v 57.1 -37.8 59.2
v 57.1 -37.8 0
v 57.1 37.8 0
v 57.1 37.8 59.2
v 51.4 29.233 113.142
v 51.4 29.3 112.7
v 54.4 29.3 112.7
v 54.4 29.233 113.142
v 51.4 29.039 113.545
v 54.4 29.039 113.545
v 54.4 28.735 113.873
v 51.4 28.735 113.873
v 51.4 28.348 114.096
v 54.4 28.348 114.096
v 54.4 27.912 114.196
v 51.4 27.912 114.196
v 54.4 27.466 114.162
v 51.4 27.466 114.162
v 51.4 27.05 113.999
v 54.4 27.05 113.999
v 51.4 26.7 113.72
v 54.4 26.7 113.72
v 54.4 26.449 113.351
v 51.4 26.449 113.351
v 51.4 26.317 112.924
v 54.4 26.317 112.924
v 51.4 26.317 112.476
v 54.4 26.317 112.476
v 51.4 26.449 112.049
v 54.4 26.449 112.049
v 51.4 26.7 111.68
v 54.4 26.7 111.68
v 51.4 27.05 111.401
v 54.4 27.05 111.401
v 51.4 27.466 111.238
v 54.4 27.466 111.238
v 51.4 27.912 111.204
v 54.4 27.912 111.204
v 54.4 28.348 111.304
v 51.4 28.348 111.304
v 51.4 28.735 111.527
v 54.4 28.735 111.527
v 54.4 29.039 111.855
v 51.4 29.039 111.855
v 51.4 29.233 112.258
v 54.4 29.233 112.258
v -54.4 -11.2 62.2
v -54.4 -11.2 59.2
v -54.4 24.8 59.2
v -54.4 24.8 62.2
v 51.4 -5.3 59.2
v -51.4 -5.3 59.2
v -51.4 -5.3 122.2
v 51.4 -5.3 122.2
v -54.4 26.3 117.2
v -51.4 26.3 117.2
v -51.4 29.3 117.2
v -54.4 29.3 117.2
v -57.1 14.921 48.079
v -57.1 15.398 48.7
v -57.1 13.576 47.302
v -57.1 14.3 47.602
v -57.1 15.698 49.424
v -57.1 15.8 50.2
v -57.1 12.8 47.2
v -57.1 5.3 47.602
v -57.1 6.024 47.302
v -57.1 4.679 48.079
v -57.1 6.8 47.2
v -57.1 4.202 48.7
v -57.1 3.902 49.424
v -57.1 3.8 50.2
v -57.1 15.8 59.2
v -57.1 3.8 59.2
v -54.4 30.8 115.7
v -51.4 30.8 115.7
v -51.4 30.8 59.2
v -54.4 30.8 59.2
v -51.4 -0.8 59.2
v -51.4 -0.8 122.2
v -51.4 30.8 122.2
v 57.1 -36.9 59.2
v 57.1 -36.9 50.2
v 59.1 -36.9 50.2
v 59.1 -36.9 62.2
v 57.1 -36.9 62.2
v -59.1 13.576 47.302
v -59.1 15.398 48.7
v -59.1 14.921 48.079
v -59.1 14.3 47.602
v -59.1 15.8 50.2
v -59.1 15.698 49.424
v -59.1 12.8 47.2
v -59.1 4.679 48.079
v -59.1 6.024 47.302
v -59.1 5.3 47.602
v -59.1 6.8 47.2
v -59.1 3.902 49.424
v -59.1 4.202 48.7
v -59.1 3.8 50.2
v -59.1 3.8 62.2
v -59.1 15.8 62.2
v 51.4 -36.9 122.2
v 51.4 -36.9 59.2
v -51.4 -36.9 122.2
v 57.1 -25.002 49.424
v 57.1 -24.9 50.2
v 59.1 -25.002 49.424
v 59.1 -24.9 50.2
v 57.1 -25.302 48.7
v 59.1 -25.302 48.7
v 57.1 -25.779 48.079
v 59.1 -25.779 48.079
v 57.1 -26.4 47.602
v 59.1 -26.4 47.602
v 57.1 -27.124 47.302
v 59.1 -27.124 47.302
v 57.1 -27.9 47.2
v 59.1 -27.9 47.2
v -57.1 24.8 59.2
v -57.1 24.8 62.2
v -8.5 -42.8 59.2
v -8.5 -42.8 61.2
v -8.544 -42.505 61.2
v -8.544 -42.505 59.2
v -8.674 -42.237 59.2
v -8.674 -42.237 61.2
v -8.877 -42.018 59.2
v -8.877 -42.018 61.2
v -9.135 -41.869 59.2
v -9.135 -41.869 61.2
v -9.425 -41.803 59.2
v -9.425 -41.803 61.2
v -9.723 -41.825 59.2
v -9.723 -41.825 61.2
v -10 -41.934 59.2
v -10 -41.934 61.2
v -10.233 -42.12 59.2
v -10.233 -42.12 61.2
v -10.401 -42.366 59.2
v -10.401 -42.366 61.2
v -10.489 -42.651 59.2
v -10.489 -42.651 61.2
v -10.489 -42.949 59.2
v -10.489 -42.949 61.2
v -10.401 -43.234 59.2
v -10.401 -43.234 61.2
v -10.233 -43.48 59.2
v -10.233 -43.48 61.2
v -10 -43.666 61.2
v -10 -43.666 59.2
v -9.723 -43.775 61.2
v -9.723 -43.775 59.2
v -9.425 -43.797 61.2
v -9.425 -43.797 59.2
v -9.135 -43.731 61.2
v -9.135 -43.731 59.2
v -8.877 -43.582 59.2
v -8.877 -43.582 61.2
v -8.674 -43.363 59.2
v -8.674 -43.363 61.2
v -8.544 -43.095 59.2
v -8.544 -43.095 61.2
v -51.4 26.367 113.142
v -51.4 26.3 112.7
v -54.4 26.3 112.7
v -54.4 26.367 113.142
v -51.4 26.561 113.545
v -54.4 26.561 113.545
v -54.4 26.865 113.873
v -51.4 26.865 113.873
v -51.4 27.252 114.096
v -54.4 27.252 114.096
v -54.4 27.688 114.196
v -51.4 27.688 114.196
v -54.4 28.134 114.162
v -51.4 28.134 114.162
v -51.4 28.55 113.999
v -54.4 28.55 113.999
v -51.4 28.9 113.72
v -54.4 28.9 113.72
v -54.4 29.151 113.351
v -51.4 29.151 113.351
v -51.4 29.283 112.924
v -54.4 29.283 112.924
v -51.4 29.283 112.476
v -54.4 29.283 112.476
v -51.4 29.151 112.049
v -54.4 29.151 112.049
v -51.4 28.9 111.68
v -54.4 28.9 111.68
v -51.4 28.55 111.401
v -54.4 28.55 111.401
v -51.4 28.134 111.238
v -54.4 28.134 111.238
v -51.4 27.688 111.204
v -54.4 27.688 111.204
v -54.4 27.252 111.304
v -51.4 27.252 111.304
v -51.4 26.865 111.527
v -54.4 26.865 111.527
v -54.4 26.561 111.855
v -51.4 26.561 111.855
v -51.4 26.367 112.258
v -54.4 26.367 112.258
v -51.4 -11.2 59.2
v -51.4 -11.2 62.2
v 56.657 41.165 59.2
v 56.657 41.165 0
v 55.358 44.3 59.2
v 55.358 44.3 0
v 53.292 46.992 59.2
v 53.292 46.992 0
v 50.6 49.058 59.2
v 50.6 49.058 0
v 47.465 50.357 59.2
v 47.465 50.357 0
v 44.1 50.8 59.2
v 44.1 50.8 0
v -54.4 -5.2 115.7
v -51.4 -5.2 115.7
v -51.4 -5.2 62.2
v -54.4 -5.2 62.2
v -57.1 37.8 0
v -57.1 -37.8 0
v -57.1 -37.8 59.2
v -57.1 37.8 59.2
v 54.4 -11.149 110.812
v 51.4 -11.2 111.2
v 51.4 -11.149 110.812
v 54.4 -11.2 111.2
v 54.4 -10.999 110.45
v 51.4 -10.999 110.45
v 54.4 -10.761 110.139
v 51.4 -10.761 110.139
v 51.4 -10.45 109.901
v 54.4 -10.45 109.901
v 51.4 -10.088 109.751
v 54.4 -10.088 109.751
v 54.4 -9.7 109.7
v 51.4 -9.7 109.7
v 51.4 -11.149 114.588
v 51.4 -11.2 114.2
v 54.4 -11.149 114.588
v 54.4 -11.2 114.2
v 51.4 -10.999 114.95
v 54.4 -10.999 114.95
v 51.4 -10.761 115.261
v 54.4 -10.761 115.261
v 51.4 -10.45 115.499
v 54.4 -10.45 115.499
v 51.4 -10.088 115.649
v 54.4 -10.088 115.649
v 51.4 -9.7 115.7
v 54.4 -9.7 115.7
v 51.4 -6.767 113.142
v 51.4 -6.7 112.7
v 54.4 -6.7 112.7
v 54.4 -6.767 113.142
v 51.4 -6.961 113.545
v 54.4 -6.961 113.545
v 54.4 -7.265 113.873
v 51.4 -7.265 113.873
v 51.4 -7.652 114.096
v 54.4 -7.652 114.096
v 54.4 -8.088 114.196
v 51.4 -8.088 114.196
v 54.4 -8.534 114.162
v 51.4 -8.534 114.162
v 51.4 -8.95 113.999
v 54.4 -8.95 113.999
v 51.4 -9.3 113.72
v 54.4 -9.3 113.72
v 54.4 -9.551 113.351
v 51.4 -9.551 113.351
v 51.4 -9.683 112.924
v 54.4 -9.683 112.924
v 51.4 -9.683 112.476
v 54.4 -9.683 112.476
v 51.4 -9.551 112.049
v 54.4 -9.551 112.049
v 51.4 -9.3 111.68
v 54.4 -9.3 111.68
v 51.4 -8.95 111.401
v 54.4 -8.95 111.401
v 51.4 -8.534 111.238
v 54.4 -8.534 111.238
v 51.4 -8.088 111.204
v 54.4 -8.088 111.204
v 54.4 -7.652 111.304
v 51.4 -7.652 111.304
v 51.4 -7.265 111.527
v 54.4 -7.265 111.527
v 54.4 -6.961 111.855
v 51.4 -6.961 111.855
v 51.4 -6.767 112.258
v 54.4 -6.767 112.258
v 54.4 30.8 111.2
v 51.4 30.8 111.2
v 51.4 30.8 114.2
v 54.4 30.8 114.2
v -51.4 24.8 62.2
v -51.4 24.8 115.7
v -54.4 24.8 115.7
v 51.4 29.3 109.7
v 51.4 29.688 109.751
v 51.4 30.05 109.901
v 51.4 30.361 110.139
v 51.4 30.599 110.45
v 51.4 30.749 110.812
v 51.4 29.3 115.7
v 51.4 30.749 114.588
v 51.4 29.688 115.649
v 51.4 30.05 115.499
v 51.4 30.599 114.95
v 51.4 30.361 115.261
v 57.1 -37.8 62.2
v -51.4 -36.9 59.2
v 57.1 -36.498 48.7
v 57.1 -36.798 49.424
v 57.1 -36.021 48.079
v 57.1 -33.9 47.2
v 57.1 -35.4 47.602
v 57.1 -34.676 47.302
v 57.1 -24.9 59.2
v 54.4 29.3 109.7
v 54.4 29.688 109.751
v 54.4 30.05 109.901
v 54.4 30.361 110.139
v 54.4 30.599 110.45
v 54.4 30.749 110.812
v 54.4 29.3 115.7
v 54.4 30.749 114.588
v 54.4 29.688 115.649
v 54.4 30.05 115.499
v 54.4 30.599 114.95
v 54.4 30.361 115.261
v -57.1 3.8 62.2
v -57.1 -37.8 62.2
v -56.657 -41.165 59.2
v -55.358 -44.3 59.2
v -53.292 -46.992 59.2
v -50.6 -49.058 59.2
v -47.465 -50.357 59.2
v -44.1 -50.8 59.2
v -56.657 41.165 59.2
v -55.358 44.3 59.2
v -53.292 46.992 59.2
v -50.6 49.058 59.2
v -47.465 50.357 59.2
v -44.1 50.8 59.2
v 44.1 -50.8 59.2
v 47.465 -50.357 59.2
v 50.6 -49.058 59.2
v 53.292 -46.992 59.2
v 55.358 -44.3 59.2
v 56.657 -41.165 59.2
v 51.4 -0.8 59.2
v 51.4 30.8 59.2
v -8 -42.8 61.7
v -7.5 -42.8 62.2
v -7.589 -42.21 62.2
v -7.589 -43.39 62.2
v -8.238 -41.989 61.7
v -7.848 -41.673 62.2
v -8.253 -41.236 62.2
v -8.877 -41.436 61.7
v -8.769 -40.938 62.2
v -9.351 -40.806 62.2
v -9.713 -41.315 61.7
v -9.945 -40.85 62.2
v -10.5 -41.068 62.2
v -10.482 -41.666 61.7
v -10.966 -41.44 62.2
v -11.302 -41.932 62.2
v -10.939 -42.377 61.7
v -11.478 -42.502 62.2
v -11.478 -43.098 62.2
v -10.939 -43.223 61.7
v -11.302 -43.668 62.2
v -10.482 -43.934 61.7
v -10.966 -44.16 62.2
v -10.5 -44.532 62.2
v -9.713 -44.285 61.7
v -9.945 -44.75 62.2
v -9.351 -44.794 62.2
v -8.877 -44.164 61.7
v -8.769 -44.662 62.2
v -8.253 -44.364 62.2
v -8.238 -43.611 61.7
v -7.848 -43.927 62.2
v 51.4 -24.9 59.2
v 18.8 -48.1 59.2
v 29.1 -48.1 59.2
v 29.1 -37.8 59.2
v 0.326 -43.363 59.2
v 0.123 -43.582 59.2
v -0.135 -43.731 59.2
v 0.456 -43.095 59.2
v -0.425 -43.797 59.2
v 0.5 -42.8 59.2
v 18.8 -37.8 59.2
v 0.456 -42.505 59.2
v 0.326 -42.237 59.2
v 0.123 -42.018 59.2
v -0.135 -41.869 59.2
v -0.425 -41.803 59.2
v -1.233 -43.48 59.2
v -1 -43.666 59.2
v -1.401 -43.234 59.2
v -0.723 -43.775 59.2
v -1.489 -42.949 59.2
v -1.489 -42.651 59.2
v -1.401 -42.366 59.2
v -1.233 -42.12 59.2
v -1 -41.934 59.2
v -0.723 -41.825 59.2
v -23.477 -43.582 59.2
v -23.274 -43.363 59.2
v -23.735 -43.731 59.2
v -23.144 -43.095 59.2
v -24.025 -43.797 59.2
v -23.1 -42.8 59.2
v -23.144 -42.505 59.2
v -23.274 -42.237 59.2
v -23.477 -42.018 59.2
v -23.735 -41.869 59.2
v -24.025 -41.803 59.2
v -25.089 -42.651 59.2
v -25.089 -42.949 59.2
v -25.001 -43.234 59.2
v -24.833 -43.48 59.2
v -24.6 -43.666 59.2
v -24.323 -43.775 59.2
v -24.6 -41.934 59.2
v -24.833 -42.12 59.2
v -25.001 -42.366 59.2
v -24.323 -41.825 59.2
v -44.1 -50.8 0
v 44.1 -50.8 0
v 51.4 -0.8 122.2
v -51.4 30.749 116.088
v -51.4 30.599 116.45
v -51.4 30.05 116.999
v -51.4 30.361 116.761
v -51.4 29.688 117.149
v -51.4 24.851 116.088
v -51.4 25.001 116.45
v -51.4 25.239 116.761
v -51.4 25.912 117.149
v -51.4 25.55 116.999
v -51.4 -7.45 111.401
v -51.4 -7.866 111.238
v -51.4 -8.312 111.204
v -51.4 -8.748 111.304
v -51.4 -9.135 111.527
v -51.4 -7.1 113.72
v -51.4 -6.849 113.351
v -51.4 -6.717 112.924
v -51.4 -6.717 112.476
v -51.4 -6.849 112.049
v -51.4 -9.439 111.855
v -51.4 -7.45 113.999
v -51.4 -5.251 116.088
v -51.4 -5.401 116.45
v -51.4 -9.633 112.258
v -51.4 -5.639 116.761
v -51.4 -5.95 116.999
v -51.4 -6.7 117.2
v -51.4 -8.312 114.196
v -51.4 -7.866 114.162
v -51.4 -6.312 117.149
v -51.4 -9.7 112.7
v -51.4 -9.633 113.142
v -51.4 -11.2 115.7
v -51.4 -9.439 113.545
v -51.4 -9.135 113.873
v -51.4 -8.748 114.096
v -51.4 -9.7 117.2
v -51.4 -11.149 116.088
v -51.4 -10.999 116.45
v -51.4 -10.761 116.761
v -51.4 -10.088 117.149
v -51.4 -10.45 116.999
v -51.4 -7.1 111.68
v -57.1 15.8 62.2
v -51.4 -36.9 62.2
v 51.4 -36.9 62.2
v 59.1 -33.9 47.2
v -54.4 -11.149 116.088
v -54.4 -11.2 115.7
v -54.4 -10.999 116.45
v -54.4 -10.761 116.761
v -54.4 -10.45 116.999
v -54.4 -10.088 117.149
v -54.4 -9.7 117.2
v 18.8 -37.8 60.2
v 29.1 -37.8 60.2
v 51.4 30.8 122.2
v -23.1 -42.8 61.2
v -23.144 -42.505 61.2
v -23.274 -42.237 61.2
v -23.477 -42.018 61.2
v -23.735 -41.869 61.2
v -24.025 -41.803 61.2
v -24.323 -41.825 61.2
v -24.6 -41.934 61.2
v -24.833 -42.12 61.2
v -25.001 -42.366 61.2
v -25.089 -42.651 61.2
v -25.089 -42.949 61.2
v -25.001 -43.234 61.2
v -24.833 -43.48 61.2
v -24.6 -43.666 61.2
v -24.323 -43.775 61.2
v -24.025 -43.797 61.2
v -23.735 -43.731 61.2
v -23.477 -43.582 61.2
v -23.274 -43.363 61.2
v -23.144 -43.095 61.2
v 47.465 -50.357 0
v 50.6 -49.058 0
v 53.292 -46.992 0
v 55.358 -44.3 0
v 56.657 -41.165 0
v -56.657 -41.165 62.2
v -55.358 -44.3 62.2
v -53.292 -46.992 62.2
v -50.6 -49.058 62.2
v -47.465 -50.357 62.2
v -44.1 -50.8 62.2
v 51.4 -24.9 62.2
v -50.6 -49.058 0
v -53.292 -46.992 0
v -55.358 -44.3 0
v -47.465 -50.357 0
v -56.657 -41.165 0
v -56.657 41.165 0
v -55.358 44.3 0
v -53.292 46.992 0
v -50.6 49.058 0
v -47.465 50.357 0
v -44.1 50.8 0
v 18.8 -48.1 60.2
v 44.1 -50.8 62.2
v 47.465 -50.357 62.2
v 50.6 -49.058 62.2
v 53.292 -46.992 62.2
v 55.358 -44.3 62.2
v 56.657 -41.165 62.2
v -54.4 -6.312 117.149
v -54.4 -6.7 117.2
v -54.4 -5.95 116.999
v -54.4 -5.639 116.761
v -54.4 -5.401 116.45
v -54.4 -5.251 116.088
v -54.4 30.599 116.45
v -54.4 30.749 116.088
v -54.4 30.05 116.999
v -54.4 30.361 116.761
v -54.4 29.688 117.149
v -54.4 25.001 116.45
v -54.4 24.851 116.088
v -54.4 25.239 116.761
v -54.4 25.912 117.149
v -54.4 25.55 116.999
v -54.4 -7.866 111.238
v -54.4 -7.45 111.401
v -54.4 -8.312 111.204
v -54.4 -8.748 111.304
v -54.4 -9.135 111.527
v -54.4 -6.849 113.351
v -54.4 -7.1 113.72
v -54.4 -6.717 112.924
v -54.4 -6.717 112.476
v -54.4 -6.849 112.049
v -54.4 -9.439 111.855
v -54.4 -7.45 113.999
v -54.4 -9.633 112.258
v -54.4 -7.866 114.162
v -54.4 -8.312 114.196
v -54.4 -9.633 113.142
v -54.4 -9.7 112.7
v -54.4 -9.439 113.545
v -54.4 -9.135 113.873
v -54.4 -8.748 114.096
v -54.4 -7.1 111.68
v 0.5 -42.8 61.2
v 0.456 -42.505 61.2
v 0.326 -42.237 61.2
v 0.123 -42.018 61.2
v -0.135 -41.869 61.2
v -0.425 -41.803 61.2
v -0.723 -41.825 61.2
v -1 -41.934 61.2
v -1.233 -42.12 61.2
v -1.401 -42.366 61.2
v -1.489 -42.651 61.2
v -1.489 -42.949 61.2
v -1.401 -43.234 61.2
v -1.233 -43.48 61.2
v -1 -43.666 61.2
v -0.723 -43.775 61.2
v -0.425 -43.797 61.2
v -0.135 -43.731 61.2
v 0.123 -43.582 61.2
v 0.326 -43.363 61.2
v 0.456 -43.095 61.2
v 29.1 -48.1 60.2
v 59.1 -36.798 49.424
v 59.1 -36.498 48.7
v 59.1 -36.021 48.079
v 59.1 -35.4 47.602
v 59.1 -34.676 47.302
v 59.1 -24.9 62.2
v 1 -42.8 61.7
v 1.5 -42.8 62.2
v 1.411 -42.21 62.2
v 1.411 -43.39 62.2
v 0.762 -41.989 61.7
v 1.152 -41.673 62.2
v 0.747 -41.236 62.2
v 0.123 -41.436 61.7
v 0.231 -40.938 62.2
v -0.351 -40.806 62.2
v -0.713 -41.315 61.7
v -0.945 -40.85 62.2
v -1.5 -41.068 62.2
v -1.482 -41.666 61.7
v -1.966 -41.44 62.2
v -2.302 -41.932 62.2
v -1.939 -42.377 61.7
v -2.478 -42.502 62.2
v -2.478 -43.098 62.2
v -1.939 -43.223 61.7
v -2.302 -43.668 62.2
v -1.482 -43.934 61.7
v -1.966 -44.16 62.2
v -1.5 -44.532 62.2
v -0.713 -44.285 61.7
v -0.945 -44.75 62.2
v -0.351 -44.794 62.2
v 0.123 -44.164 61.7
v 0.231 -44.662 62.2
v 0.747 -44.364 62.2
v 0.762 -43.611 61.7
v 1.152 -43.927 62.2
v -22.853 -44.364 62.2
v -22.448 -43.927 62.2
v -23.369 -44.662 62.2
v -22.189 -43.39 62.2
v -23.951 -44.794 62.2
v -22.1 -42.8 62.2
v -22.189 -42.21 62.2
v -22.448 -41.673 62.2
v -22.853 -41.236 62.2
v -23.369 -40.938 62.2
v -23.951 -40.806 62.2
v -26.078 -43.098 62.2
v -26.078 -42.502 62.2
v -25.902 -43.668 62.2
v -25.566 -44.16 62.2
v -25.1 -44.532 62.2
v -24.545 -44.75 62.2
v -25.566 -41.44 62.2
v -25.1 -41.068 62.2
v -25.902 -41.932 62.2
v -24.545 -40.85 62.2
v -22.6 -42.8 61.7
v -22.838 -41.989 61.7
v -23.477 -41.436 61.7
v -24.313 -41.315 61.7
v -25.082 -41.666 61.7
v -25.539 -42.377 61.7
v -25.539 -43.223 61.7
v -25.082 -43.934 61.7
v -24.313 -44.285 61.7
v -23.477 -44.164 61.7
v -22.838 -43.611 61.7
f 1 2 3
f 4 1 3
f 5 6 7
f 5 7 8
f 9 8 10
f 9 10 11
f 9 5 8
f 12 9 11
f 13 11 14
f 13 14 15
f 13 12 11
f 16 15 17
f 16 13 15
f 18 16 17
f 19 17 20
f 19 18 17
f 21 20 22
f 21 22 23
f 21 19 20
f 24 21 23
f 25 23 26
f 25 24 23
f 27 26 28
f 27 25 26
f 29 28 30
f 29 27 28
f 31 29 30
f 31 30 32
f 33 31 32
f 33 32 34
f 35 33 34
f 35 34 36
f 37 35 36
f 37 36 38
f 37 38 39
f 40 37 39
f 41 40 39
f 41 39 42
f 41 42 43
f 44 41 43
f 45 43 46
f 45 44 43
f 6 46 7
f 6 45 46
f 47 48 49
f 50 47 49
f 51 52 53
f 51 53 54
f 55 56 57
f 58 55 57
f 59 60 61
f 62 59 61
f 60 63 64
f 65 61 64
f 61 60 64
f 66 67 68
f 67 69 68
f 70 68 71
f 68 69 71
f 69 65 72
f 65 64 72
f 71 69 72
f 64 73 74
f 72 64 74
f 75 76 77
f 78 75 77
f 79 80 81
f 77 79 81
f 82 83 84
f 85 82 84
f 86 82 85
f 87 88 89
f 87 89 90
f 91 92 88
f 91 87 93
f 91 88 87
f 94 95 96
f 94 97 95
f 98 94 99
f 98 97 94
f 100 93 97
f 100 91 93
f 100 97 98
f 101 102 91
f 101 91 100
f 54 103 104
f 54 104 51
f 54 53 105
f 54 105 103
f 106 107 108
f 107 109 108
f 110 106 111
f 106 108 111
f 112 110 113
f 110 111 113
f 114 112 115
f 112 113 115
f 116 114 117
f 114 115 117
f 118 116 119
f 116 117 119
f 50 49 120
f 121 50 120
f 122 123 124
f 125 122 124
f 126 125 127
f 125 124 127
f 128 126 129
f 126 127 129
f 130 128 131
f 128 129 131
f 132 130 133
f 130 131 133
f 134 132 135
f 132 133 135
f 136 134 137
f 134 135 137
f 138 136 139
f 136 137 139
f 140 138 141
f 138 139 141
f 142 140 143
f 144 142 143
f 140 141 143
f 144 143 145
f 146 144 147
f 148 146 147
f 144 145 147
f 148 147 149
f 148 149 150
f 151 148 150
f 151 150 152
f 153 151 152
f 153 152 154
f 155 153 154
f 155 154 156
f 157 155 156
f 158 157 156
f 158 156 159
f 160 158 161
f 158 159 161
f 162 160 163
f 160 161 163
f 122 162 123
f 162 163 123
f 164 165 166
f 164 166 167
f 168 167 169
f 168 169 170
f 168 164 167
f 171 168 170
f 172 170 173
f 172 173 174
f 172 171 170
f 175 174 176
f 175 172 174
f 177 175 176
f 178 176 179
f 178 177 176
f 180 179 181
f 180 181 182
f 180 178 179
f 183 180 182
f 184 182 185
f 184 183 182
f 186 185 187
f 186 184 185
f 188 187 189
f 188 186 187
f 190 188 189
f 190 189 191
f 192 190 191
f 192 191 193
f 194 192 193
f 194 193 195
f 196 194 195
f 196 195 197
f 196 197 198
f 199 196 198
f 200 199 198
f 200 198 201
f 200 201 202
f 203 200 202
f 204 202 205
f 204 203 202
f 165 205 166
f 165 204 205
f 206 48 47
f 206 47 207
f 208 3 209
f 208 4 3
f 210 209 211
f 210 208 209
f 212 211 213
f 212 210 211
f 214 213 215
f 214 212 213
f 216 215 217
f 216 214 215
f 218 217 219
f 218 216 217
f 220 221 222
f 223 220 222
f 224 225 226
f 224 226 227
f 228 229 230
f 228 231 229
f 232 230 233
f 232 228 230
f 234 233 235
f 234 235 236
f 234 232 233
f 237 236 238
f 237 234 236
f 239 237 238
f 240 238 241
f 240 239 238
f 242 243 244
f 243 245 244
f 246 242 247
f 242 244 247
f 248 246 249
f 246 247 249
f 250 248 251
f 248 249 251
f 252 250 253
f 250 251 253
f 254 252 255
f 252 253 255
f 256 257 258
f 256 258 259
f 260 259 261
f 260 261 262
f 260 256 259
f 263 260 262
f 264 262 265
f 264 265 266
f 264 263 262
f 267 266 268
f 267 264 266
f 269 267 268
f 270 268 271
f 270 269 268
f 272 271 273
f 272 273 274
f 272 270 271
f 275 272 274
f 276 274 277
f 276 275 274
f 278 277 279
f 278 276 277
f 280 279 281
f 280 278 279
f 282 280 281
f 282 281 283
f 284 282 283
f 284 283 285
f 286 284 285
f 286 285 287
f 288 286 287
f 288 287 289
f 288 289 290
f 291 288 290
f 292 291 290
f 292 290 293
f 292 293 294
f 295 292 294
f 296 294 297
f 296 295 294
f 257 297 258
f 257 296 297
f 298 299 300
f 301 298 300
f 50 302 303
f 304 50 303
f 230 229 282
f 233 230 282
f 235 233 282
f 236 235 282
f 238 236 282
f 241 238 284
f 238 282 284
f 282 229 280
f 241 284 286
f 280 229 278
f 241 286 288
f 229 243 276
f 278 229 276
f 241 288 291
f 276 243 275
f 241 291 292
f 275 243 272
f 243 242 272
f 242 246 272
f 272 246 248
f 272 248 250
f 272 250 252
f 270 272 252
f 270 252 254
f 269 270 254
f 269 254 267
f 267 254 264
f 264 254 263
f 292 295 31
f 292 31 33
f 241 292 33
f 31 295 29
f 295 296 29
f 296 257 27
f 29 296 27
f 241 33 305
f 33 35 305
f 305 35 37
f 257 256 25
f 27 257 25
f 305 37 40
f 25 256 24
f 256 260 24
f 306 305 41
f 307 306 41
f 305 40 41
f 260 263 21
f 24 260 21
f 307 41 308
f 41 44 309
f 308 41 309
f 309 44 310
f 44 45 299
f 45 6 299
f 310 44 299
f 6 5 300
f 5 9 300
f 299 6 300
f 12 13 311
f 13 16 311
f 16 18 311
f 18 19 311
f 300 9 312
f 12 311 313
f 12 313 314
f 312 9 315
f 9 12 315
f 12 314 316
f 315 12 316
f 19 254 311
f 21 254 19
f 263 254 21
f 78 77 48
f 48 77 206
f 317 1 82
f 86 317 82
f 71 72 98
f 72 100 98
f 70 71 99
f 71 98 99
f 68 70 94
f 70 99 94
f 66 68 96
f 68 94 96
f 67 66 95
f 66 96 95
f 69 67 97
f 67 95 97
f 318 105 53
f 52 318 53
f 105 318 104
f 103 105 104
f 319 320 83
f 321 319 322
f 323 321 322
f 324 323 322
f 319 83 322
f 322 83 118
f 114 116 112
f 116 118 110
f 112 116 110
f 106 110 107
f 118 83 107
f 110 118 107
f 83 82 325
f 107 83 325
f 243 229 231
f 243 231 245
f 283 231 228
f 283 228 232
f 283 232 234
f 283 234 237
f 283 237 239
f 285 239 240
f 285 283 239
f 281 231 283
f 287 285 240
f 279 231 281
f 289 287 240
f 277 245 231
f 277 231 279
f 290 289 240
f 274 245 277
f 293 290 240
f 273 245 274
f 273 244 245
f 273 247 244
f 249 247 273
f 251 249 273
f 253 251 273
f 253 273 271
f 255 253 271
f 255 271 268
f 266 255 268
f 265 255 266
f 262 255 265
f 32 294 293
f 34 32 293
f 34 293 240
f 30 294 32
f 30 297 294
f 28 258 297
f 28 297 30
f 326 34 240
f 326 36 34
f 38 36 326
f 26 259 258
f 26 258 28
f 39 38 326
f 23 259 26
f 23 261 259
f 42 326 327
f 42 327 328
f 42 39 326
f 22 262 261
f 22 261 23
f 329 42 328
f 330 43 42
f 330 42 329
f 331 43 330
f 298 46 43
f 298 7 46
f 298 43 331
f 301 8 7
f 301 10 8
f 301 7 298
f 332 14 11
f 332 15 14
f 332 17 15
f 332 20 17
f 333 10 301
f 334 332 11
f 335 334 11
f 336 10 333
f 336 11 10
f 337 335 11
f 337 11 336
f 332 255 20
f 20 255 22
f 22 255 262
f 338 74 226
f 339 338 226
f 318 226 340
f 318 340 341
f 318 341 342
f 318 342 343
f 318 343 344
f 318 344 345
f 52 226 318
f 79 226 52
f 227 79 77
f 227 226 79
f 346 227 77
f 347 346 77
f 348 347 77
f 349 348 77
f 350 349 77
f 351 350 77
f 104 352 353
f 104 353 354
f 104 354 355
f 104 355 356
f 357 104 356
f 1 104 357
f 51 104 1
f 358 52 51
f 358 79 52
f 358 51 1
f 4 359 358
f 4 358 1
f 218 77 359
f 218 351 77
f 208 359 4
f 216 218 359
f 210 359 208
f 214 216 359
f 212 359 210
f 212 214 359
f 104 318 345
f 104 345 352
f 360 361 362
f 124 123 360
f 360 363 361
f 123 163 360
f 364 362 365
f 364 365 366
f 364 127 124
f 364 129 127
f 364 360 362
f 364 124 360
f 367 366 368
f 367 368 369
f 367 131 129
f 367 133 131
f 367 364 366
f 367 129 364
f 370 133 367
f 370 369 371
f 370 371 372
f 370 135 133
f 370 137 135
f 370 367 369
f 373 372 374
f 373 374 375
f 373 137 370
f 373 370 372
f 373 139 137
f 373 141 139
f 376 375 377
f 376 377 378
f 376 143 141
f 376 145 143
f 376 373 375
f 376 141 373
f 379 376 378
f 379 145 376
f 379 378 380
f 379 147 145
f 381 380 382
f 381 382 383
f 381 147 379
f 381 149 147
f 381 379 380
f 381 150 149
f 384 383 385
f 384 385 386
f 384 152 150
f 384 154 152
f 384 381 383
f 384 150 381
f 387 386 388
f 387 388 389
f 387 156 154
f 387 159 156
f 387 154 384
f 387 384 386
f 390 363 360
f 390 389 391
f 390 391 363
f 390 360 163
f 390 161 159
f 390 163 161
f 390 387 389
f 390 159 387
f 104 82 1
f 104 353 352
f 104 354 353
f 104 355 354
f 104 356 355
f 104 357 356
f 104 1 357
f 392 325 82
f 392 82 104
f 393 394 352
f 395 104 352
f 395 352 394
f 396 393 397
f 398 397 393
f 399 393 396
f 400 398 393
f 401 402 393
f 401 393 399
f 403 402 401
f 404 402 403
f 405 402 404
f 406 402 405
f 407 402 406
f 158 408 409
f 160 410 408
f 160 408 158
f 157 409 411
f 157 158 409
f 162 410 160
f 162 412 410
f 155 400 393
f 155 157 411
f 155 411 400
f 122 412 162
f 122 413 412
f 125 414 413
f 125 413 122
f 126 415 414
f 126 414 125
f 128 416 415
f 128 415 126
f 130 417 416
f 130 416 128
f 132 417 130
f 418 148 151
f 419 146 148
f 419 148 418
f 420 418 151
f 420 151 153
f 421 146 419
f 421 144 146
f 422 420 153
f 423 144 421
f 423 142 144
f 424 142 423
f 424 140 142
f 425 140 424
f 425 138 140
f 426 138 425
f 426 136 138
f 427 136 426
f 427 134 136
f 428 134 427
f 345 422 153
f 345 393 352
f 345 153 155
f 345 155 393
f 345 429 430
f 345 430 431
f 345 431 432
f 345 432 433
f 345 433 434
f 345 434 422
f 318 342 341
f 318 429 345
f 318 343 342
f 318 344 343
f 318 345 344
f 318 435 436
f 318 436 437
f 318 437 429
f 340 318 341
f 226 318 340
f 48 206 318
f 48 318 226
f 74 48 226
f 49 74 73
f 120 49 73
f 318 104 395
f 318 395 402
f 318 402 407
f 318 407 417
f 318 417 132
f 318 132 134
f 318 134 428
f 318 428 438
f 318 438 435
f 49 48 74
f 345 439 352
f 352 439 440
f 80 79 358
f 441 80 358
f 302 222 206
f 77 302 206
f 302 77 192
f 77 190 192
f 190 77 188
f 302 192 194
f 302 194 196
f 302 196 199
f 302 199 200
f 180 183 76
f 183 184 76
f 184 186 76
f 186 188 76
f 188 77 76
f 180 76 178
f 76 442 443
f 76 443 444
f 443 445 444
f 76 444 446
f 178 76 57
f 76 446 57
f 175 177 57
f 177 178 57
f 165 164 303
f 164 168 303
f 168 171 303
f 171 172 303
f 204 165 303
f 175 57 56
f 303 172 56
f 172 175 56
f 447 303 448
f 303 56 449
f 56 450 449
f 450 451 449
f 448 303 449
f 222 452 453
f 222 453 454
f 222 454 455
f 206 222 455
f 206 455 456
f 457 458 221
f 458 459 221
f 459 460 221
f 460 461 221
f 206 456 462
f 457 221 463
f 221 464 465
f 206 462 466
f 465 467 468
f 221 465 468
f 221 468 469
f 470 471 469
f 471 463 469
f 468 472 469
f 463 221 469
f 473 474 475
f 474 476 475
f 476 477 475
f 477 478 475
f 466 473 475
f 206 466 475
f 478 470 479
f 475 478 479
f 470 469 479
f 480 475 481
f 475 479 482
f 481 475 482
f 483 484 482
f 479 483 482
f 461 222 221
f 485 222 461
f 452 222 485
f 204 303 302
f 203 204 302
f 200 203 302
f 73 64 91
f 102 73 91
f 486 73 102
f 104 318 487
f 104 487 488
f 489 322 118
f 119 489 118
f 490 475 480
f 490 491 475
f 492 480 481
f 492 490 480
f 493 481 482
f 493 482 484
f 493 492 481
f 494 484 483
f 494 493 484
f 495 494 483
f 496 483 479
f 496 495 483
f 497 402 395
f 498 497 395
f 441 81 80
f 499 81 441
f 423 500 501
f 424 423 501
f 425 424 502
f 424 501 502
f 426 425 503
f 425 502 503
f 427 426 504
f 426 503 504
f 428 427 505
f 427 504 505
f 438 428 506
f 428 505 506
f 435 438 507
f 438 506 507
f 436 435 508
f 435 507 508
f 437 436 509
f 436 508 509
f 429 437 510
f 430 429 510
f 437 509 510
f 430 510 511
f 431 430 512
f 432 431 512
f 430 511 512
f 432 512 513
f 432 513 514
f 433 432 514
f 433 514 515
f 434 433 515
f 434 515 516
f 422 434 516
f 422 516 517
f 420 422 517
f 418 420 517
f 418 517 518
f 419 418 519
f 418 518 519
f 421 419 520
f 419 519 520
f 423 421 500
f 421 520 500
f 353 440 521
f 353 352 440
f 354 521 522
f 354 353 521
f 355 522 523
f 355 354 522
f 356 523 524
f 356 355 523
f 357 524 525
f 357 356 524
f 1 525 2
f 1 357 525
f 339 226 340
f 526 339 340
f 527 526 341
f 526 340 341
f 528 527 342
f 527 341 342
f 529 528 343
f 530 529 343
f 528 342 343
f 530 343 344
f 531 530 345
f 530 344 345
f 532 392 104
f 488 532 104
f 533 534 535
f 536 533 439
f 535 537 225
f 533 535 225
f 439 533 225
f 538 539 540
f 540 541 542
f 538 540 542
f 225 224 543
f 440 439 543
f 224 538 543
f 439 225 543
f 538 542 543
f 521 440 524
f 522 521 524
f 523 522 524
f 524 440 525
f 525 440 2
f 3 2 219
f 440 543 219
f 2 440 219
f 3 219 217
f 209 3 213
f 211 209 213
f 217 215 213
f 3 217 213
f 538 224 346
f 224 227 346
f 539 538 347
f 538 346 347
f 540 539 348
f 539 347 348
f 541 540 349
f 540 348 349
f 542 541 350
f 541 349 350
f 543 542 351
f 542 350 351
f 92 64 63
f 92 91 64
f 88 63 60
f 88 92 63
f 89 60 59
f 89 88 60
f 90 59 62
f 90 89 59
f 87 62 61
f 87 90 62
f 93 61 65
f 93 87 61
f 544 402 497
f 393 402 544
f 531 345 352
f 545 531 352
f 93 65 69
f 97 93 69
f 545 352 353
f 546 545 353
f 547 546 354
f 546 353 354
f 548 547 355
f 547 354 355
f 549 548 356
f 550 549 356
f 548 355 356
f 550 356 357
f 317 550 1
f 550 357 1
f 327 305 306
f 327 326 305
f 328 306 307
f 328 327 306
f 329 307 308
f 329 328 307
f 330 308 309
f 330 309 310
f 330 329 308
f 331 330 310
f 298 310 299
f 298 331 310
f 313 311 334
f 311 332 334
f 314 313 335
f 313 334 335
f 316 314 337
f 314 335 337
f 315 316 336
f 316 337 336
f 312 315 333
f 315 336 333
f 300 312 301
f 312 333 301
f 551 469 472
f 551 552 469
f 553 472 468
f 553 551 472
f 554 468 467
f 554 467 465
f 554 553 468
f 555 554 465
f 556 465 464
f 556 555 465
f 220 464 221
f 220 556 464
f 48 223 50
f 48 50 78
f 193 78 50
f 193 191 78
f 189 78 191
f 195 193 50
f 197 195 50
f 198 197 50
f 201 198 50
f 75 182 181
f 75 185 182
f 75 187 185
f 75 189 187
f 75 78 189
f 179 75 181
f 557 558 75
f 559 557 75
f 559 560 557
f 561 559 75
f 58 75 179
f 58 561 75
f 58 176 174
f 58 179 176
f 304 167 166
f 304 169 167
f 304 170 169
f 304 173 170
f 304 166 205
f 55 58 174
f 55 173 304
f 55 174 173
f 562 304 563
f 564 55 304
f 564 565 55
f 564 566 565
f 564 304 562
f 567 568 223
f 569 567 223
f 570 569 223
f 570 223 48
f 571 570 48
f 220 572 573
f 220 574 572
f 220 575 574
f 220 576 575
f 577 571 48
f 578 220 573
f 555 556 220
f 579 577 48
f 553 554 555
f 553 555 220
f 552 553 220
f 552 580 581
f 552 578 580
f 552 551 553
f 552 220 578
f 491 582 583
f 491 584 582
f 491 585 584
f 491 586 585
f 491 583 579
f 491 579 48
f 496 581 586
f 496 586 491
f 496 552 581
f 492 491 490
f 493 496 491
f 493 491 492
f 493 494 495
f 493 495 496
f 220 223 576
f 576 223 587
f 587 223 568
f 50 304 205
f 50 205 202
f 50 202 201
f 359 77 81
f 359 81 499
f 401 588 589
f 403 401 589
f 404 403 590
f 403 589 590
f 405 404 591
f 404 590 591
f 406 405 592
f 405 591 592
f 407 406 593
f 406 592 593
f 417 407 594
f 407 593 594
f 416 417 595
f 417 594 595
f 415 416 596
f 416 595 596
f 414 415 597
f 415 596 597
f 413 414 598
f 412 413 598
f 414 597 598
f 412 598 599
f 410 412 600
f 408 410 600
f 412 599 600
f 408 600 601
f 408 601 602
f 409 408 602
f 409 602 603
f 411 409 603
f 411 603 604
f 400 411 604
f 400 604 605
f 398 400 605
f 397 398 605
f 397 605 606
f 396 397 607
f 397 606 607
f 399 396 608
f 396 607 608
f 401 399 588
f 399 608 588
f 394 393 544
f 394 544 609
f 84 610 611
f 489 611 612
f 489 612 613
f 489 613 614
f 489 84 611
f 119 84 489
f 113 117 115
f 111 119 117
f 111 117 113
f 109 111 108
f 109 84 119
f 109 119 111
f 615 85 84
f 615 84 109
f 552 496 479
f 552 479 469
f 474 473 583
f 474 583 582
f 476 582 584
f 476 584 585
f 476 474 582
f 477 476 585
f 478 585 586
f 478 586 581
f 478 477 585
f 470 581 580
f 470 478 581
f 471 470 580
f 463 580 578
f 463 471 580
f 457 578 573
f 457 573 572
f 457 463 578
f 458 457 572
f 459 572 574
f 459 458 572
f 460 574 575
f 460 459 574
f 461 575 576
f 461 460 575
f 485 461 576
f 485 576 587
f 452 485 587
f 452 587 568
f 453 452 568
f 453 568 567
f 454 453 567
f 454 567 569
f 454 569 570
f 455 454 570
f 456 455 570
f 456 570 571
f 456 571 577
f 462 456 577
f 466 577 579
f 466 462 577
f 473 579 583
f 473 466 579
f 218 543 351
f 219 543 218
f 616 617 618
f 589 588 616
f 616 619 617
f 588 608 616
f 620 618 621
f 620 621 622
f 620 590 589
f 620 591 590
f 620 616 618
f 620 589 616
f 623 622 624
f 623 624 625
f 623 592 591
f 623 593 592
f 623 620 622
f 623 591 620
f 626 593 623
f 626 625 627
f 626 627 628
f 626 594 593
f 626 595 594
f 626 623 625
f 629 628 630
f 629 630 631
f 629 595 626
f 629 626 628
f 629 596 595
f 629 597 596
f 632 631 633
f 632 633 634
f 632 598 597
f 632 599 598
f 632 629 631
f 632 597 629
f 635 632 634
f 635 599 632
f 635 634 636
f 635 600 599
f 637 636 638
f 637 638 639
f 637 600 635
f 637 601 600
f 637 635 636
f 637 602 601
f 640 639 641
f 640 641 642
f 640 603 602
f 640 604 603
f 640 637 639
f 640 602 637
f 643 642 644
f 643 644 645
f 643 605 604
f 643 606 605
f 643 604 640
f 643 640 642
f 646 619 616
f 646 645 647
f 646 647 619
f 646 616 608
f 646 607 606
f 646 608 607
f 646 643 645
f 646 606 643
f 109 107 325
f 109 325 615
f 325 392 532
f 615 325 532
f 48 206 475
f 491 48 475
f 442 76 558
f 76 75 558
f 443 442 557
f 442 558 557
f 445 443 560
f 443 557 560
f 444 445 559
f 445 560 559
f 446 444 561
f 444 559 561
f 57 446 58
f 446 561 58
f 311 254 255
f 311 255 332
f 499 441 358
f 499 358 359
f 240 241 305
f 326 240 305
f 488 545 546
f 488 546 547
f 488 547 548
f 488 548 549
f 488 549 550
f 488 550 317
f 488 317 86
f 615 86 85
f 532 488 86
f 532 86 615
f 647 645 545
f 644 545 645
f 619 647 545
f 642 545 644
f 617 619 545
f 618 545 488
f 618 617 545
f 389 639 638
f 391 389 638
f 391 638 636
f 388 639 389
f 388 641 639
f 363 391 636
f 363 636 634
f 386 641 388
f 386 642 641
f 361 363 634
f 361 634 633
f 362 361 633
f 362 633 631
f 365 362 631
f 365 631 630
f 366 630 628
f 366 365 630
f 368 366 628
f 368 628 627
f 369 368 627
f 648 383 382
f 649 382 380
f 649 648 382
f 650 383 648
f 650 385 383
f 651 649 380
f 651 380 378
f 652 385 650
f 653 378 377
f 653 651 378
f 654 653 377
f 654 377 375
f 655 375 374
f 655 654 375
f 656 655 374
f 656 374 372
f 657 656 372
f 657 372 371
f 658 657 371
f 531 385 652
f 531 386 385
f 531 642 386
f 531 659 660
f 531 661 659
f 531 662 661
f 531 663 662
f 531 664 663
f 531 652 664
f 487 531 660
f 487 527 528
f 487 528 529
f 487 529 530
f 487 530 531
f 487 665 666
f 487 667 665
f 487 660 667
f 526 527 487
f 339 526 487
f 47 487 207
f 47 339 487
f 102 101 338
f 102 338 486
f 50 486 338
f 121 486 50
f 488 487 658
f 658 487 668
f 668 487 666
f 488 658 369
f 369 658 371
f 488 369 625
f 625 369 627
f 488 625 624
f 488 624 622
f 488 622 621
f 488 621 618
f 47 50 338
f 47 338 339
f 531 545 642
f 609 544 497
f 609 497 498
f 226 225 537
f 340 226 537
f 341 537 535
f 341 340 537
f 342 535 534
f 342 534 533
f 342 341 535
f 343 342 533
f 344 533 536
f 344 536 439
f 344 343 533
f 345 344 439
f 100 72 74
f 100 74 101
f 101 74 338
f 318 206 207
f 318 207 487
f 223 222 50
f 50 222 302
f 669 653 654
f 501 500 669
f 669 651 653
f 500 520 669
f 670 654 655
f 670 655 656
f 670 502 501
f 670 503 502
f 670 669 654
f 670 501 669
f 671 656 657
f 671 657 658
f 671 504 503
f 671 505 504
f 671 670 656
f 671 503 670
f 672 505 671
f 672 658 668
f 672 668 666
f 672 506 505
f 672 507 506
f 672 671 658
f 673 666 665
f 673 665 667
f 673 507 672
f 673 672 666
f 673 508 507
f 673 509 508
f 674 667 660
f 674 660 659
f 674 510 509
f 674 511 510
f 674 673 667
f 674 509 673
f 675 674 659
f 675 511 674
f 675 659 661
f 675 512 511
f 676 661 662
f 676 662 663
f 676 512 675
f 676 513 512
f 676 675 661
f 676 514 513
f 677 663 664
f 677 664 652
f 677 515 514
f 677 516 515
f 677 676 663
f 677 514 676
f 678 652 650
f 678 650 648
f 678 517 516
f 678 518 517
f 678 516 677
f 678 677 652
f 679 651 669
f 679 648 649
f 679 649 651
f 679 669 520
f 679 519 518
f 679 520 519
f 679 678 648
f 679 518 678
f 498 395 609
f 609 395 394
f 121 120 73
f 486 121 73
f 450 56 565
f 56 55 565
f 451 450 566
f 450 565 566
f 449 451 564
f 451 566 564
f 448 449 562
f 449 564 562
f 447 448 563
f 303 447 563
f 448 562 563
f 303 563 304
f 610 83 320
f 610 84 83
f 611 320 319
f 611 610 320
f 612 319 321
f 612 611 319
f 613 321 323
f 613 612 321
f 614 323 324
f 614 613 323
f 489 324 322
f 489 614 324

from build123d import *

# Parameters (mm, degrees)
SKETCH_R        = 1.5
PAD_DEPTH       = 3
FILLET_R        = 1.5
SKETCH001_W     = 114.2
SKETCH001_H     = 101.6
PAD001_DEPTH    = 59.2
FILLET001_R     = 13
SKETCH002_W     = 102.8
SKETCH002_H     = 31.6
PAD002_DEPTH    = 63
SKETCH003_W     = 42
SKETCH003_H     = 6
SKETCH003_R     = 1.5
PAD003_DEPTH    = 3
FILLET002_R     = 1.5
PAD004_DEPTH    = 3
SKETCH005_R     = 1
POCKET_DEPTH    = 3
SKETCH006_W     = 12
SKETCH006_H     = 15
PAD005_DEPTH    = 2
SKETCH008_W     = 12
SKETCH008_H     = 15
PAD006_DEPTH    = 2
SKETCH009_W     = 10.3
SKETCH009_H     = 10.3
POCKET001_DEPTH = 1
CHAMFER_SIZE    = 1
FILLET003_R     = 3


with BuildPart() as drive_mount_a:
    # Sketch (on DatumPlane) → Pad (new body)
    with BuildSketch(Plane(origin=(-51.4, 0, 0), x_dir=(0, -1, 0), z_dir=(-1, 0, 0))):
        Polygon((-30.8, 117.2), (-30.8, 59.2), (11.2, 59.2), (11.2, 117.2), (5.2, 117.2), (5.2, 62.2), (-24.8, 62.2), (-24.8, 117.2), align=None)
        with Locations((-27.8, 112.7)):
            Circle(SKETCH_R, mode=Mode.SUBTRACT)
        with Locations((8.2, 112.7)):
            Circle(SKETCH_R, mode=Mode.SUBTRACT)
    extrude(amount=PAD_DEPTH)

    # Fillet
    fillet_edges = [drive_mount_a.edges().sort_by_distance(p)[0] for p in [
        (-52.9, 30.8, 117.2),
        (-52.9, 24.8, 117.2),
        (-52.9, -5.2, 117.2),
        (-52.9, -11.2, 117.2),
    ]]
    fillet(fillet_edges, radius=FILLET_R)


with BuildPart() as fideco_body:
    # Sketch001 → Pad001 (new body)
    with BuildSketch(Plane.XY):
        Rectangle(SKETCH001_W, SKETCH001_H)
    extrude(amount=PAD001_DEPTH)

    # Fillet001
    fillet001_edges = [fideco_body.edges().sort_by_distance(p)[0] for p in [
        (57.1, 50.8, 29.6),
        (57.1, -50.8, 29.6),
        (-57.1, -50.8, 29.6),
        (-57.1, 50.8, 29.6),
    ]]
    fillet(fillet001_edges, radius=FILLET001_R)

    # Sketch002 (on Face6 of Pad001) → Pad002 (join)
    with BuildSketch(Plane.XY.offset(59.2)):
        with Locations((0, 15)):
            Rectangle(SKETCH002_W, SKETCH002_H)
        with Locations((0, -21.1)):
            Rectangle(SKETCH002_W, SKETCH002_H)
    extrude(amount=PAD002_DEPTH)


with BuildPart() as drive_mount_b:
    # Sketch003 (on Face16 of ShapeBinder001) → Pad003 (new body)
    with BuildSketch(Plane.YZ.offset(51.4)):
        with Locations((9.8, 112.7)):
            Rectangle(SKETCH003_W, SKETCH003_H)
        with Locations((27.8, 112.7)):
            Circle(SKETCH003_R, mode=Mode.SUBTRACT)
        with Locations((-8.2, 112.7)):
            Circle(SKETCH003_R, mode=Mode.SUBTRACT)
    extrude(amount=PAD003_DEPTH)

    # Fillet002
    fillet002_edges = [drive_mount_b.edges().sort_by_distance(p)[0] for p in [
        (52.9, -11.2, 115.7),
        (52.9, -11.2, 109.7),
        (52.9, 30.8, 109.7),
        (52.9, 30.8, 115.7),
    ]]
    fillet(fillet002_edges, radius=FILLET002_R)


with BuildPart() as body_cover:
    # Sketch004 (on Face5 of ShapeBinder002) → Pad004 (new body)
    with BuildSketch(Plane.XY.offset(59.2)):
        with BuildLine():
            Line((-54.4, -11.2), (-51.4, -11.2))
            Line((-51.4, -11.2), (-51.4, -36.9))
            Line((-51.4, -36.9), (51.4, -36.9))
            Line((51.4, -24.9), (51.4, -36.9))
            Line((57.1, -24.9), (51.4, -24.9))
            Line((57.1, -37.8), (57.1, -24.9))
            ThreePointArc((44.1, -50.8), (53.292388, -46.992388), (57.1, -37.8))
            Line((-44.1, -50.8), (44.1, -50.8))
            ThreePointArc((-57.1, -37.8), (-53.292388, -46.992388), (-44.1, -50.8))
            Line((-57.1, 24.8), (-57.1, -37.8))
            Line((-54.4, 24.8), (-57.1, 24.8))
            Line((-54.4, -11.2), (-54.4, 24.8))
        make_face()
    extrude(amount=PAD004_DEPTH)

    # Sketch005 (on Face14 of Pad004) → Pocket (cut)
    with BuildSketch(Plane.XY.offset(62.2)):
        with Locations((-24.1, -42.8)):
            Circle(SKETCH005_R)
        with Locations((-9.5, -42.8)):
            Circle(SKETCH005_R)
        with Locations((-0.5, -42.8)):
            Circle(SKETCH005_R)
    extrude(amount=-POCKET_DEPTH, mode=Mode.SUBTRACT)

    # Sketch006 (on Face8 of Pocket) → Pad005 (join)
    with BuildSketch(Plane(origin=(-57.1, 0, 0), x_dir=(0, -1, 0), z_dir=(-1, 0, 0))):
        with Locations((-9.8, 54.7)):
            Rectangle(SKETCH006_W, SKETCH006_H)
    extrude(amount=PAD005_DEPTH)

    # Sketch008 (on Face15 of Pad005) → Pad006 (join)
    with BuildSketch(Plane.YZ.offset(57.1)):
        with Locations((-30.9, 54.7)):
            Rectangle(SKETCH008_W, SKETCH008_H)
    extrude(amount=PAD006_DEPTH)

    # Sketch009 (on Face4 of Pad006) → Pocket001 (cut)
    with BuildSketch(Plane(origin=(0, 0, 59.2), x_dir=(1, 0, 0), z_dir=(0, 0, -1))):
        with Locations((23.95, 42.95)):
            Rectangle(SKETCH009_W, SKETCH009_H)
    extrude(amount=-POCKET001_DEPTH, mode=Mode.SUBTRACT)

    # Chamfer
    chamfer_edges = [body_cover.edges().sort_by_distance(p)[0] for p in [
        (-10.5, -42.8, 62.2),
        (-25.1, -42.8, 62.2),
        (-1.5, -42.8, 62.2),
    ]]
    chamfer(chamfer_edges, length=CHAMFER_SIZE)

    # Fillet003
    fillet003_edges = [body_cover.edges().sort_by_distance(p)[0] for p in [
        (58.1, -24.9, 47.2),
        (58.1, -36.9, 47.2),
        (-58.1, 15.8, 47.2),
        (-58.1, 3.8, 47.2),
    ]]
    fillet(fillet003_edges, radius=FILLET003_R)


solid = Compound([drive_mount_a.part, fideco_body.part, drive_mount_b.part, body_cover.part])
